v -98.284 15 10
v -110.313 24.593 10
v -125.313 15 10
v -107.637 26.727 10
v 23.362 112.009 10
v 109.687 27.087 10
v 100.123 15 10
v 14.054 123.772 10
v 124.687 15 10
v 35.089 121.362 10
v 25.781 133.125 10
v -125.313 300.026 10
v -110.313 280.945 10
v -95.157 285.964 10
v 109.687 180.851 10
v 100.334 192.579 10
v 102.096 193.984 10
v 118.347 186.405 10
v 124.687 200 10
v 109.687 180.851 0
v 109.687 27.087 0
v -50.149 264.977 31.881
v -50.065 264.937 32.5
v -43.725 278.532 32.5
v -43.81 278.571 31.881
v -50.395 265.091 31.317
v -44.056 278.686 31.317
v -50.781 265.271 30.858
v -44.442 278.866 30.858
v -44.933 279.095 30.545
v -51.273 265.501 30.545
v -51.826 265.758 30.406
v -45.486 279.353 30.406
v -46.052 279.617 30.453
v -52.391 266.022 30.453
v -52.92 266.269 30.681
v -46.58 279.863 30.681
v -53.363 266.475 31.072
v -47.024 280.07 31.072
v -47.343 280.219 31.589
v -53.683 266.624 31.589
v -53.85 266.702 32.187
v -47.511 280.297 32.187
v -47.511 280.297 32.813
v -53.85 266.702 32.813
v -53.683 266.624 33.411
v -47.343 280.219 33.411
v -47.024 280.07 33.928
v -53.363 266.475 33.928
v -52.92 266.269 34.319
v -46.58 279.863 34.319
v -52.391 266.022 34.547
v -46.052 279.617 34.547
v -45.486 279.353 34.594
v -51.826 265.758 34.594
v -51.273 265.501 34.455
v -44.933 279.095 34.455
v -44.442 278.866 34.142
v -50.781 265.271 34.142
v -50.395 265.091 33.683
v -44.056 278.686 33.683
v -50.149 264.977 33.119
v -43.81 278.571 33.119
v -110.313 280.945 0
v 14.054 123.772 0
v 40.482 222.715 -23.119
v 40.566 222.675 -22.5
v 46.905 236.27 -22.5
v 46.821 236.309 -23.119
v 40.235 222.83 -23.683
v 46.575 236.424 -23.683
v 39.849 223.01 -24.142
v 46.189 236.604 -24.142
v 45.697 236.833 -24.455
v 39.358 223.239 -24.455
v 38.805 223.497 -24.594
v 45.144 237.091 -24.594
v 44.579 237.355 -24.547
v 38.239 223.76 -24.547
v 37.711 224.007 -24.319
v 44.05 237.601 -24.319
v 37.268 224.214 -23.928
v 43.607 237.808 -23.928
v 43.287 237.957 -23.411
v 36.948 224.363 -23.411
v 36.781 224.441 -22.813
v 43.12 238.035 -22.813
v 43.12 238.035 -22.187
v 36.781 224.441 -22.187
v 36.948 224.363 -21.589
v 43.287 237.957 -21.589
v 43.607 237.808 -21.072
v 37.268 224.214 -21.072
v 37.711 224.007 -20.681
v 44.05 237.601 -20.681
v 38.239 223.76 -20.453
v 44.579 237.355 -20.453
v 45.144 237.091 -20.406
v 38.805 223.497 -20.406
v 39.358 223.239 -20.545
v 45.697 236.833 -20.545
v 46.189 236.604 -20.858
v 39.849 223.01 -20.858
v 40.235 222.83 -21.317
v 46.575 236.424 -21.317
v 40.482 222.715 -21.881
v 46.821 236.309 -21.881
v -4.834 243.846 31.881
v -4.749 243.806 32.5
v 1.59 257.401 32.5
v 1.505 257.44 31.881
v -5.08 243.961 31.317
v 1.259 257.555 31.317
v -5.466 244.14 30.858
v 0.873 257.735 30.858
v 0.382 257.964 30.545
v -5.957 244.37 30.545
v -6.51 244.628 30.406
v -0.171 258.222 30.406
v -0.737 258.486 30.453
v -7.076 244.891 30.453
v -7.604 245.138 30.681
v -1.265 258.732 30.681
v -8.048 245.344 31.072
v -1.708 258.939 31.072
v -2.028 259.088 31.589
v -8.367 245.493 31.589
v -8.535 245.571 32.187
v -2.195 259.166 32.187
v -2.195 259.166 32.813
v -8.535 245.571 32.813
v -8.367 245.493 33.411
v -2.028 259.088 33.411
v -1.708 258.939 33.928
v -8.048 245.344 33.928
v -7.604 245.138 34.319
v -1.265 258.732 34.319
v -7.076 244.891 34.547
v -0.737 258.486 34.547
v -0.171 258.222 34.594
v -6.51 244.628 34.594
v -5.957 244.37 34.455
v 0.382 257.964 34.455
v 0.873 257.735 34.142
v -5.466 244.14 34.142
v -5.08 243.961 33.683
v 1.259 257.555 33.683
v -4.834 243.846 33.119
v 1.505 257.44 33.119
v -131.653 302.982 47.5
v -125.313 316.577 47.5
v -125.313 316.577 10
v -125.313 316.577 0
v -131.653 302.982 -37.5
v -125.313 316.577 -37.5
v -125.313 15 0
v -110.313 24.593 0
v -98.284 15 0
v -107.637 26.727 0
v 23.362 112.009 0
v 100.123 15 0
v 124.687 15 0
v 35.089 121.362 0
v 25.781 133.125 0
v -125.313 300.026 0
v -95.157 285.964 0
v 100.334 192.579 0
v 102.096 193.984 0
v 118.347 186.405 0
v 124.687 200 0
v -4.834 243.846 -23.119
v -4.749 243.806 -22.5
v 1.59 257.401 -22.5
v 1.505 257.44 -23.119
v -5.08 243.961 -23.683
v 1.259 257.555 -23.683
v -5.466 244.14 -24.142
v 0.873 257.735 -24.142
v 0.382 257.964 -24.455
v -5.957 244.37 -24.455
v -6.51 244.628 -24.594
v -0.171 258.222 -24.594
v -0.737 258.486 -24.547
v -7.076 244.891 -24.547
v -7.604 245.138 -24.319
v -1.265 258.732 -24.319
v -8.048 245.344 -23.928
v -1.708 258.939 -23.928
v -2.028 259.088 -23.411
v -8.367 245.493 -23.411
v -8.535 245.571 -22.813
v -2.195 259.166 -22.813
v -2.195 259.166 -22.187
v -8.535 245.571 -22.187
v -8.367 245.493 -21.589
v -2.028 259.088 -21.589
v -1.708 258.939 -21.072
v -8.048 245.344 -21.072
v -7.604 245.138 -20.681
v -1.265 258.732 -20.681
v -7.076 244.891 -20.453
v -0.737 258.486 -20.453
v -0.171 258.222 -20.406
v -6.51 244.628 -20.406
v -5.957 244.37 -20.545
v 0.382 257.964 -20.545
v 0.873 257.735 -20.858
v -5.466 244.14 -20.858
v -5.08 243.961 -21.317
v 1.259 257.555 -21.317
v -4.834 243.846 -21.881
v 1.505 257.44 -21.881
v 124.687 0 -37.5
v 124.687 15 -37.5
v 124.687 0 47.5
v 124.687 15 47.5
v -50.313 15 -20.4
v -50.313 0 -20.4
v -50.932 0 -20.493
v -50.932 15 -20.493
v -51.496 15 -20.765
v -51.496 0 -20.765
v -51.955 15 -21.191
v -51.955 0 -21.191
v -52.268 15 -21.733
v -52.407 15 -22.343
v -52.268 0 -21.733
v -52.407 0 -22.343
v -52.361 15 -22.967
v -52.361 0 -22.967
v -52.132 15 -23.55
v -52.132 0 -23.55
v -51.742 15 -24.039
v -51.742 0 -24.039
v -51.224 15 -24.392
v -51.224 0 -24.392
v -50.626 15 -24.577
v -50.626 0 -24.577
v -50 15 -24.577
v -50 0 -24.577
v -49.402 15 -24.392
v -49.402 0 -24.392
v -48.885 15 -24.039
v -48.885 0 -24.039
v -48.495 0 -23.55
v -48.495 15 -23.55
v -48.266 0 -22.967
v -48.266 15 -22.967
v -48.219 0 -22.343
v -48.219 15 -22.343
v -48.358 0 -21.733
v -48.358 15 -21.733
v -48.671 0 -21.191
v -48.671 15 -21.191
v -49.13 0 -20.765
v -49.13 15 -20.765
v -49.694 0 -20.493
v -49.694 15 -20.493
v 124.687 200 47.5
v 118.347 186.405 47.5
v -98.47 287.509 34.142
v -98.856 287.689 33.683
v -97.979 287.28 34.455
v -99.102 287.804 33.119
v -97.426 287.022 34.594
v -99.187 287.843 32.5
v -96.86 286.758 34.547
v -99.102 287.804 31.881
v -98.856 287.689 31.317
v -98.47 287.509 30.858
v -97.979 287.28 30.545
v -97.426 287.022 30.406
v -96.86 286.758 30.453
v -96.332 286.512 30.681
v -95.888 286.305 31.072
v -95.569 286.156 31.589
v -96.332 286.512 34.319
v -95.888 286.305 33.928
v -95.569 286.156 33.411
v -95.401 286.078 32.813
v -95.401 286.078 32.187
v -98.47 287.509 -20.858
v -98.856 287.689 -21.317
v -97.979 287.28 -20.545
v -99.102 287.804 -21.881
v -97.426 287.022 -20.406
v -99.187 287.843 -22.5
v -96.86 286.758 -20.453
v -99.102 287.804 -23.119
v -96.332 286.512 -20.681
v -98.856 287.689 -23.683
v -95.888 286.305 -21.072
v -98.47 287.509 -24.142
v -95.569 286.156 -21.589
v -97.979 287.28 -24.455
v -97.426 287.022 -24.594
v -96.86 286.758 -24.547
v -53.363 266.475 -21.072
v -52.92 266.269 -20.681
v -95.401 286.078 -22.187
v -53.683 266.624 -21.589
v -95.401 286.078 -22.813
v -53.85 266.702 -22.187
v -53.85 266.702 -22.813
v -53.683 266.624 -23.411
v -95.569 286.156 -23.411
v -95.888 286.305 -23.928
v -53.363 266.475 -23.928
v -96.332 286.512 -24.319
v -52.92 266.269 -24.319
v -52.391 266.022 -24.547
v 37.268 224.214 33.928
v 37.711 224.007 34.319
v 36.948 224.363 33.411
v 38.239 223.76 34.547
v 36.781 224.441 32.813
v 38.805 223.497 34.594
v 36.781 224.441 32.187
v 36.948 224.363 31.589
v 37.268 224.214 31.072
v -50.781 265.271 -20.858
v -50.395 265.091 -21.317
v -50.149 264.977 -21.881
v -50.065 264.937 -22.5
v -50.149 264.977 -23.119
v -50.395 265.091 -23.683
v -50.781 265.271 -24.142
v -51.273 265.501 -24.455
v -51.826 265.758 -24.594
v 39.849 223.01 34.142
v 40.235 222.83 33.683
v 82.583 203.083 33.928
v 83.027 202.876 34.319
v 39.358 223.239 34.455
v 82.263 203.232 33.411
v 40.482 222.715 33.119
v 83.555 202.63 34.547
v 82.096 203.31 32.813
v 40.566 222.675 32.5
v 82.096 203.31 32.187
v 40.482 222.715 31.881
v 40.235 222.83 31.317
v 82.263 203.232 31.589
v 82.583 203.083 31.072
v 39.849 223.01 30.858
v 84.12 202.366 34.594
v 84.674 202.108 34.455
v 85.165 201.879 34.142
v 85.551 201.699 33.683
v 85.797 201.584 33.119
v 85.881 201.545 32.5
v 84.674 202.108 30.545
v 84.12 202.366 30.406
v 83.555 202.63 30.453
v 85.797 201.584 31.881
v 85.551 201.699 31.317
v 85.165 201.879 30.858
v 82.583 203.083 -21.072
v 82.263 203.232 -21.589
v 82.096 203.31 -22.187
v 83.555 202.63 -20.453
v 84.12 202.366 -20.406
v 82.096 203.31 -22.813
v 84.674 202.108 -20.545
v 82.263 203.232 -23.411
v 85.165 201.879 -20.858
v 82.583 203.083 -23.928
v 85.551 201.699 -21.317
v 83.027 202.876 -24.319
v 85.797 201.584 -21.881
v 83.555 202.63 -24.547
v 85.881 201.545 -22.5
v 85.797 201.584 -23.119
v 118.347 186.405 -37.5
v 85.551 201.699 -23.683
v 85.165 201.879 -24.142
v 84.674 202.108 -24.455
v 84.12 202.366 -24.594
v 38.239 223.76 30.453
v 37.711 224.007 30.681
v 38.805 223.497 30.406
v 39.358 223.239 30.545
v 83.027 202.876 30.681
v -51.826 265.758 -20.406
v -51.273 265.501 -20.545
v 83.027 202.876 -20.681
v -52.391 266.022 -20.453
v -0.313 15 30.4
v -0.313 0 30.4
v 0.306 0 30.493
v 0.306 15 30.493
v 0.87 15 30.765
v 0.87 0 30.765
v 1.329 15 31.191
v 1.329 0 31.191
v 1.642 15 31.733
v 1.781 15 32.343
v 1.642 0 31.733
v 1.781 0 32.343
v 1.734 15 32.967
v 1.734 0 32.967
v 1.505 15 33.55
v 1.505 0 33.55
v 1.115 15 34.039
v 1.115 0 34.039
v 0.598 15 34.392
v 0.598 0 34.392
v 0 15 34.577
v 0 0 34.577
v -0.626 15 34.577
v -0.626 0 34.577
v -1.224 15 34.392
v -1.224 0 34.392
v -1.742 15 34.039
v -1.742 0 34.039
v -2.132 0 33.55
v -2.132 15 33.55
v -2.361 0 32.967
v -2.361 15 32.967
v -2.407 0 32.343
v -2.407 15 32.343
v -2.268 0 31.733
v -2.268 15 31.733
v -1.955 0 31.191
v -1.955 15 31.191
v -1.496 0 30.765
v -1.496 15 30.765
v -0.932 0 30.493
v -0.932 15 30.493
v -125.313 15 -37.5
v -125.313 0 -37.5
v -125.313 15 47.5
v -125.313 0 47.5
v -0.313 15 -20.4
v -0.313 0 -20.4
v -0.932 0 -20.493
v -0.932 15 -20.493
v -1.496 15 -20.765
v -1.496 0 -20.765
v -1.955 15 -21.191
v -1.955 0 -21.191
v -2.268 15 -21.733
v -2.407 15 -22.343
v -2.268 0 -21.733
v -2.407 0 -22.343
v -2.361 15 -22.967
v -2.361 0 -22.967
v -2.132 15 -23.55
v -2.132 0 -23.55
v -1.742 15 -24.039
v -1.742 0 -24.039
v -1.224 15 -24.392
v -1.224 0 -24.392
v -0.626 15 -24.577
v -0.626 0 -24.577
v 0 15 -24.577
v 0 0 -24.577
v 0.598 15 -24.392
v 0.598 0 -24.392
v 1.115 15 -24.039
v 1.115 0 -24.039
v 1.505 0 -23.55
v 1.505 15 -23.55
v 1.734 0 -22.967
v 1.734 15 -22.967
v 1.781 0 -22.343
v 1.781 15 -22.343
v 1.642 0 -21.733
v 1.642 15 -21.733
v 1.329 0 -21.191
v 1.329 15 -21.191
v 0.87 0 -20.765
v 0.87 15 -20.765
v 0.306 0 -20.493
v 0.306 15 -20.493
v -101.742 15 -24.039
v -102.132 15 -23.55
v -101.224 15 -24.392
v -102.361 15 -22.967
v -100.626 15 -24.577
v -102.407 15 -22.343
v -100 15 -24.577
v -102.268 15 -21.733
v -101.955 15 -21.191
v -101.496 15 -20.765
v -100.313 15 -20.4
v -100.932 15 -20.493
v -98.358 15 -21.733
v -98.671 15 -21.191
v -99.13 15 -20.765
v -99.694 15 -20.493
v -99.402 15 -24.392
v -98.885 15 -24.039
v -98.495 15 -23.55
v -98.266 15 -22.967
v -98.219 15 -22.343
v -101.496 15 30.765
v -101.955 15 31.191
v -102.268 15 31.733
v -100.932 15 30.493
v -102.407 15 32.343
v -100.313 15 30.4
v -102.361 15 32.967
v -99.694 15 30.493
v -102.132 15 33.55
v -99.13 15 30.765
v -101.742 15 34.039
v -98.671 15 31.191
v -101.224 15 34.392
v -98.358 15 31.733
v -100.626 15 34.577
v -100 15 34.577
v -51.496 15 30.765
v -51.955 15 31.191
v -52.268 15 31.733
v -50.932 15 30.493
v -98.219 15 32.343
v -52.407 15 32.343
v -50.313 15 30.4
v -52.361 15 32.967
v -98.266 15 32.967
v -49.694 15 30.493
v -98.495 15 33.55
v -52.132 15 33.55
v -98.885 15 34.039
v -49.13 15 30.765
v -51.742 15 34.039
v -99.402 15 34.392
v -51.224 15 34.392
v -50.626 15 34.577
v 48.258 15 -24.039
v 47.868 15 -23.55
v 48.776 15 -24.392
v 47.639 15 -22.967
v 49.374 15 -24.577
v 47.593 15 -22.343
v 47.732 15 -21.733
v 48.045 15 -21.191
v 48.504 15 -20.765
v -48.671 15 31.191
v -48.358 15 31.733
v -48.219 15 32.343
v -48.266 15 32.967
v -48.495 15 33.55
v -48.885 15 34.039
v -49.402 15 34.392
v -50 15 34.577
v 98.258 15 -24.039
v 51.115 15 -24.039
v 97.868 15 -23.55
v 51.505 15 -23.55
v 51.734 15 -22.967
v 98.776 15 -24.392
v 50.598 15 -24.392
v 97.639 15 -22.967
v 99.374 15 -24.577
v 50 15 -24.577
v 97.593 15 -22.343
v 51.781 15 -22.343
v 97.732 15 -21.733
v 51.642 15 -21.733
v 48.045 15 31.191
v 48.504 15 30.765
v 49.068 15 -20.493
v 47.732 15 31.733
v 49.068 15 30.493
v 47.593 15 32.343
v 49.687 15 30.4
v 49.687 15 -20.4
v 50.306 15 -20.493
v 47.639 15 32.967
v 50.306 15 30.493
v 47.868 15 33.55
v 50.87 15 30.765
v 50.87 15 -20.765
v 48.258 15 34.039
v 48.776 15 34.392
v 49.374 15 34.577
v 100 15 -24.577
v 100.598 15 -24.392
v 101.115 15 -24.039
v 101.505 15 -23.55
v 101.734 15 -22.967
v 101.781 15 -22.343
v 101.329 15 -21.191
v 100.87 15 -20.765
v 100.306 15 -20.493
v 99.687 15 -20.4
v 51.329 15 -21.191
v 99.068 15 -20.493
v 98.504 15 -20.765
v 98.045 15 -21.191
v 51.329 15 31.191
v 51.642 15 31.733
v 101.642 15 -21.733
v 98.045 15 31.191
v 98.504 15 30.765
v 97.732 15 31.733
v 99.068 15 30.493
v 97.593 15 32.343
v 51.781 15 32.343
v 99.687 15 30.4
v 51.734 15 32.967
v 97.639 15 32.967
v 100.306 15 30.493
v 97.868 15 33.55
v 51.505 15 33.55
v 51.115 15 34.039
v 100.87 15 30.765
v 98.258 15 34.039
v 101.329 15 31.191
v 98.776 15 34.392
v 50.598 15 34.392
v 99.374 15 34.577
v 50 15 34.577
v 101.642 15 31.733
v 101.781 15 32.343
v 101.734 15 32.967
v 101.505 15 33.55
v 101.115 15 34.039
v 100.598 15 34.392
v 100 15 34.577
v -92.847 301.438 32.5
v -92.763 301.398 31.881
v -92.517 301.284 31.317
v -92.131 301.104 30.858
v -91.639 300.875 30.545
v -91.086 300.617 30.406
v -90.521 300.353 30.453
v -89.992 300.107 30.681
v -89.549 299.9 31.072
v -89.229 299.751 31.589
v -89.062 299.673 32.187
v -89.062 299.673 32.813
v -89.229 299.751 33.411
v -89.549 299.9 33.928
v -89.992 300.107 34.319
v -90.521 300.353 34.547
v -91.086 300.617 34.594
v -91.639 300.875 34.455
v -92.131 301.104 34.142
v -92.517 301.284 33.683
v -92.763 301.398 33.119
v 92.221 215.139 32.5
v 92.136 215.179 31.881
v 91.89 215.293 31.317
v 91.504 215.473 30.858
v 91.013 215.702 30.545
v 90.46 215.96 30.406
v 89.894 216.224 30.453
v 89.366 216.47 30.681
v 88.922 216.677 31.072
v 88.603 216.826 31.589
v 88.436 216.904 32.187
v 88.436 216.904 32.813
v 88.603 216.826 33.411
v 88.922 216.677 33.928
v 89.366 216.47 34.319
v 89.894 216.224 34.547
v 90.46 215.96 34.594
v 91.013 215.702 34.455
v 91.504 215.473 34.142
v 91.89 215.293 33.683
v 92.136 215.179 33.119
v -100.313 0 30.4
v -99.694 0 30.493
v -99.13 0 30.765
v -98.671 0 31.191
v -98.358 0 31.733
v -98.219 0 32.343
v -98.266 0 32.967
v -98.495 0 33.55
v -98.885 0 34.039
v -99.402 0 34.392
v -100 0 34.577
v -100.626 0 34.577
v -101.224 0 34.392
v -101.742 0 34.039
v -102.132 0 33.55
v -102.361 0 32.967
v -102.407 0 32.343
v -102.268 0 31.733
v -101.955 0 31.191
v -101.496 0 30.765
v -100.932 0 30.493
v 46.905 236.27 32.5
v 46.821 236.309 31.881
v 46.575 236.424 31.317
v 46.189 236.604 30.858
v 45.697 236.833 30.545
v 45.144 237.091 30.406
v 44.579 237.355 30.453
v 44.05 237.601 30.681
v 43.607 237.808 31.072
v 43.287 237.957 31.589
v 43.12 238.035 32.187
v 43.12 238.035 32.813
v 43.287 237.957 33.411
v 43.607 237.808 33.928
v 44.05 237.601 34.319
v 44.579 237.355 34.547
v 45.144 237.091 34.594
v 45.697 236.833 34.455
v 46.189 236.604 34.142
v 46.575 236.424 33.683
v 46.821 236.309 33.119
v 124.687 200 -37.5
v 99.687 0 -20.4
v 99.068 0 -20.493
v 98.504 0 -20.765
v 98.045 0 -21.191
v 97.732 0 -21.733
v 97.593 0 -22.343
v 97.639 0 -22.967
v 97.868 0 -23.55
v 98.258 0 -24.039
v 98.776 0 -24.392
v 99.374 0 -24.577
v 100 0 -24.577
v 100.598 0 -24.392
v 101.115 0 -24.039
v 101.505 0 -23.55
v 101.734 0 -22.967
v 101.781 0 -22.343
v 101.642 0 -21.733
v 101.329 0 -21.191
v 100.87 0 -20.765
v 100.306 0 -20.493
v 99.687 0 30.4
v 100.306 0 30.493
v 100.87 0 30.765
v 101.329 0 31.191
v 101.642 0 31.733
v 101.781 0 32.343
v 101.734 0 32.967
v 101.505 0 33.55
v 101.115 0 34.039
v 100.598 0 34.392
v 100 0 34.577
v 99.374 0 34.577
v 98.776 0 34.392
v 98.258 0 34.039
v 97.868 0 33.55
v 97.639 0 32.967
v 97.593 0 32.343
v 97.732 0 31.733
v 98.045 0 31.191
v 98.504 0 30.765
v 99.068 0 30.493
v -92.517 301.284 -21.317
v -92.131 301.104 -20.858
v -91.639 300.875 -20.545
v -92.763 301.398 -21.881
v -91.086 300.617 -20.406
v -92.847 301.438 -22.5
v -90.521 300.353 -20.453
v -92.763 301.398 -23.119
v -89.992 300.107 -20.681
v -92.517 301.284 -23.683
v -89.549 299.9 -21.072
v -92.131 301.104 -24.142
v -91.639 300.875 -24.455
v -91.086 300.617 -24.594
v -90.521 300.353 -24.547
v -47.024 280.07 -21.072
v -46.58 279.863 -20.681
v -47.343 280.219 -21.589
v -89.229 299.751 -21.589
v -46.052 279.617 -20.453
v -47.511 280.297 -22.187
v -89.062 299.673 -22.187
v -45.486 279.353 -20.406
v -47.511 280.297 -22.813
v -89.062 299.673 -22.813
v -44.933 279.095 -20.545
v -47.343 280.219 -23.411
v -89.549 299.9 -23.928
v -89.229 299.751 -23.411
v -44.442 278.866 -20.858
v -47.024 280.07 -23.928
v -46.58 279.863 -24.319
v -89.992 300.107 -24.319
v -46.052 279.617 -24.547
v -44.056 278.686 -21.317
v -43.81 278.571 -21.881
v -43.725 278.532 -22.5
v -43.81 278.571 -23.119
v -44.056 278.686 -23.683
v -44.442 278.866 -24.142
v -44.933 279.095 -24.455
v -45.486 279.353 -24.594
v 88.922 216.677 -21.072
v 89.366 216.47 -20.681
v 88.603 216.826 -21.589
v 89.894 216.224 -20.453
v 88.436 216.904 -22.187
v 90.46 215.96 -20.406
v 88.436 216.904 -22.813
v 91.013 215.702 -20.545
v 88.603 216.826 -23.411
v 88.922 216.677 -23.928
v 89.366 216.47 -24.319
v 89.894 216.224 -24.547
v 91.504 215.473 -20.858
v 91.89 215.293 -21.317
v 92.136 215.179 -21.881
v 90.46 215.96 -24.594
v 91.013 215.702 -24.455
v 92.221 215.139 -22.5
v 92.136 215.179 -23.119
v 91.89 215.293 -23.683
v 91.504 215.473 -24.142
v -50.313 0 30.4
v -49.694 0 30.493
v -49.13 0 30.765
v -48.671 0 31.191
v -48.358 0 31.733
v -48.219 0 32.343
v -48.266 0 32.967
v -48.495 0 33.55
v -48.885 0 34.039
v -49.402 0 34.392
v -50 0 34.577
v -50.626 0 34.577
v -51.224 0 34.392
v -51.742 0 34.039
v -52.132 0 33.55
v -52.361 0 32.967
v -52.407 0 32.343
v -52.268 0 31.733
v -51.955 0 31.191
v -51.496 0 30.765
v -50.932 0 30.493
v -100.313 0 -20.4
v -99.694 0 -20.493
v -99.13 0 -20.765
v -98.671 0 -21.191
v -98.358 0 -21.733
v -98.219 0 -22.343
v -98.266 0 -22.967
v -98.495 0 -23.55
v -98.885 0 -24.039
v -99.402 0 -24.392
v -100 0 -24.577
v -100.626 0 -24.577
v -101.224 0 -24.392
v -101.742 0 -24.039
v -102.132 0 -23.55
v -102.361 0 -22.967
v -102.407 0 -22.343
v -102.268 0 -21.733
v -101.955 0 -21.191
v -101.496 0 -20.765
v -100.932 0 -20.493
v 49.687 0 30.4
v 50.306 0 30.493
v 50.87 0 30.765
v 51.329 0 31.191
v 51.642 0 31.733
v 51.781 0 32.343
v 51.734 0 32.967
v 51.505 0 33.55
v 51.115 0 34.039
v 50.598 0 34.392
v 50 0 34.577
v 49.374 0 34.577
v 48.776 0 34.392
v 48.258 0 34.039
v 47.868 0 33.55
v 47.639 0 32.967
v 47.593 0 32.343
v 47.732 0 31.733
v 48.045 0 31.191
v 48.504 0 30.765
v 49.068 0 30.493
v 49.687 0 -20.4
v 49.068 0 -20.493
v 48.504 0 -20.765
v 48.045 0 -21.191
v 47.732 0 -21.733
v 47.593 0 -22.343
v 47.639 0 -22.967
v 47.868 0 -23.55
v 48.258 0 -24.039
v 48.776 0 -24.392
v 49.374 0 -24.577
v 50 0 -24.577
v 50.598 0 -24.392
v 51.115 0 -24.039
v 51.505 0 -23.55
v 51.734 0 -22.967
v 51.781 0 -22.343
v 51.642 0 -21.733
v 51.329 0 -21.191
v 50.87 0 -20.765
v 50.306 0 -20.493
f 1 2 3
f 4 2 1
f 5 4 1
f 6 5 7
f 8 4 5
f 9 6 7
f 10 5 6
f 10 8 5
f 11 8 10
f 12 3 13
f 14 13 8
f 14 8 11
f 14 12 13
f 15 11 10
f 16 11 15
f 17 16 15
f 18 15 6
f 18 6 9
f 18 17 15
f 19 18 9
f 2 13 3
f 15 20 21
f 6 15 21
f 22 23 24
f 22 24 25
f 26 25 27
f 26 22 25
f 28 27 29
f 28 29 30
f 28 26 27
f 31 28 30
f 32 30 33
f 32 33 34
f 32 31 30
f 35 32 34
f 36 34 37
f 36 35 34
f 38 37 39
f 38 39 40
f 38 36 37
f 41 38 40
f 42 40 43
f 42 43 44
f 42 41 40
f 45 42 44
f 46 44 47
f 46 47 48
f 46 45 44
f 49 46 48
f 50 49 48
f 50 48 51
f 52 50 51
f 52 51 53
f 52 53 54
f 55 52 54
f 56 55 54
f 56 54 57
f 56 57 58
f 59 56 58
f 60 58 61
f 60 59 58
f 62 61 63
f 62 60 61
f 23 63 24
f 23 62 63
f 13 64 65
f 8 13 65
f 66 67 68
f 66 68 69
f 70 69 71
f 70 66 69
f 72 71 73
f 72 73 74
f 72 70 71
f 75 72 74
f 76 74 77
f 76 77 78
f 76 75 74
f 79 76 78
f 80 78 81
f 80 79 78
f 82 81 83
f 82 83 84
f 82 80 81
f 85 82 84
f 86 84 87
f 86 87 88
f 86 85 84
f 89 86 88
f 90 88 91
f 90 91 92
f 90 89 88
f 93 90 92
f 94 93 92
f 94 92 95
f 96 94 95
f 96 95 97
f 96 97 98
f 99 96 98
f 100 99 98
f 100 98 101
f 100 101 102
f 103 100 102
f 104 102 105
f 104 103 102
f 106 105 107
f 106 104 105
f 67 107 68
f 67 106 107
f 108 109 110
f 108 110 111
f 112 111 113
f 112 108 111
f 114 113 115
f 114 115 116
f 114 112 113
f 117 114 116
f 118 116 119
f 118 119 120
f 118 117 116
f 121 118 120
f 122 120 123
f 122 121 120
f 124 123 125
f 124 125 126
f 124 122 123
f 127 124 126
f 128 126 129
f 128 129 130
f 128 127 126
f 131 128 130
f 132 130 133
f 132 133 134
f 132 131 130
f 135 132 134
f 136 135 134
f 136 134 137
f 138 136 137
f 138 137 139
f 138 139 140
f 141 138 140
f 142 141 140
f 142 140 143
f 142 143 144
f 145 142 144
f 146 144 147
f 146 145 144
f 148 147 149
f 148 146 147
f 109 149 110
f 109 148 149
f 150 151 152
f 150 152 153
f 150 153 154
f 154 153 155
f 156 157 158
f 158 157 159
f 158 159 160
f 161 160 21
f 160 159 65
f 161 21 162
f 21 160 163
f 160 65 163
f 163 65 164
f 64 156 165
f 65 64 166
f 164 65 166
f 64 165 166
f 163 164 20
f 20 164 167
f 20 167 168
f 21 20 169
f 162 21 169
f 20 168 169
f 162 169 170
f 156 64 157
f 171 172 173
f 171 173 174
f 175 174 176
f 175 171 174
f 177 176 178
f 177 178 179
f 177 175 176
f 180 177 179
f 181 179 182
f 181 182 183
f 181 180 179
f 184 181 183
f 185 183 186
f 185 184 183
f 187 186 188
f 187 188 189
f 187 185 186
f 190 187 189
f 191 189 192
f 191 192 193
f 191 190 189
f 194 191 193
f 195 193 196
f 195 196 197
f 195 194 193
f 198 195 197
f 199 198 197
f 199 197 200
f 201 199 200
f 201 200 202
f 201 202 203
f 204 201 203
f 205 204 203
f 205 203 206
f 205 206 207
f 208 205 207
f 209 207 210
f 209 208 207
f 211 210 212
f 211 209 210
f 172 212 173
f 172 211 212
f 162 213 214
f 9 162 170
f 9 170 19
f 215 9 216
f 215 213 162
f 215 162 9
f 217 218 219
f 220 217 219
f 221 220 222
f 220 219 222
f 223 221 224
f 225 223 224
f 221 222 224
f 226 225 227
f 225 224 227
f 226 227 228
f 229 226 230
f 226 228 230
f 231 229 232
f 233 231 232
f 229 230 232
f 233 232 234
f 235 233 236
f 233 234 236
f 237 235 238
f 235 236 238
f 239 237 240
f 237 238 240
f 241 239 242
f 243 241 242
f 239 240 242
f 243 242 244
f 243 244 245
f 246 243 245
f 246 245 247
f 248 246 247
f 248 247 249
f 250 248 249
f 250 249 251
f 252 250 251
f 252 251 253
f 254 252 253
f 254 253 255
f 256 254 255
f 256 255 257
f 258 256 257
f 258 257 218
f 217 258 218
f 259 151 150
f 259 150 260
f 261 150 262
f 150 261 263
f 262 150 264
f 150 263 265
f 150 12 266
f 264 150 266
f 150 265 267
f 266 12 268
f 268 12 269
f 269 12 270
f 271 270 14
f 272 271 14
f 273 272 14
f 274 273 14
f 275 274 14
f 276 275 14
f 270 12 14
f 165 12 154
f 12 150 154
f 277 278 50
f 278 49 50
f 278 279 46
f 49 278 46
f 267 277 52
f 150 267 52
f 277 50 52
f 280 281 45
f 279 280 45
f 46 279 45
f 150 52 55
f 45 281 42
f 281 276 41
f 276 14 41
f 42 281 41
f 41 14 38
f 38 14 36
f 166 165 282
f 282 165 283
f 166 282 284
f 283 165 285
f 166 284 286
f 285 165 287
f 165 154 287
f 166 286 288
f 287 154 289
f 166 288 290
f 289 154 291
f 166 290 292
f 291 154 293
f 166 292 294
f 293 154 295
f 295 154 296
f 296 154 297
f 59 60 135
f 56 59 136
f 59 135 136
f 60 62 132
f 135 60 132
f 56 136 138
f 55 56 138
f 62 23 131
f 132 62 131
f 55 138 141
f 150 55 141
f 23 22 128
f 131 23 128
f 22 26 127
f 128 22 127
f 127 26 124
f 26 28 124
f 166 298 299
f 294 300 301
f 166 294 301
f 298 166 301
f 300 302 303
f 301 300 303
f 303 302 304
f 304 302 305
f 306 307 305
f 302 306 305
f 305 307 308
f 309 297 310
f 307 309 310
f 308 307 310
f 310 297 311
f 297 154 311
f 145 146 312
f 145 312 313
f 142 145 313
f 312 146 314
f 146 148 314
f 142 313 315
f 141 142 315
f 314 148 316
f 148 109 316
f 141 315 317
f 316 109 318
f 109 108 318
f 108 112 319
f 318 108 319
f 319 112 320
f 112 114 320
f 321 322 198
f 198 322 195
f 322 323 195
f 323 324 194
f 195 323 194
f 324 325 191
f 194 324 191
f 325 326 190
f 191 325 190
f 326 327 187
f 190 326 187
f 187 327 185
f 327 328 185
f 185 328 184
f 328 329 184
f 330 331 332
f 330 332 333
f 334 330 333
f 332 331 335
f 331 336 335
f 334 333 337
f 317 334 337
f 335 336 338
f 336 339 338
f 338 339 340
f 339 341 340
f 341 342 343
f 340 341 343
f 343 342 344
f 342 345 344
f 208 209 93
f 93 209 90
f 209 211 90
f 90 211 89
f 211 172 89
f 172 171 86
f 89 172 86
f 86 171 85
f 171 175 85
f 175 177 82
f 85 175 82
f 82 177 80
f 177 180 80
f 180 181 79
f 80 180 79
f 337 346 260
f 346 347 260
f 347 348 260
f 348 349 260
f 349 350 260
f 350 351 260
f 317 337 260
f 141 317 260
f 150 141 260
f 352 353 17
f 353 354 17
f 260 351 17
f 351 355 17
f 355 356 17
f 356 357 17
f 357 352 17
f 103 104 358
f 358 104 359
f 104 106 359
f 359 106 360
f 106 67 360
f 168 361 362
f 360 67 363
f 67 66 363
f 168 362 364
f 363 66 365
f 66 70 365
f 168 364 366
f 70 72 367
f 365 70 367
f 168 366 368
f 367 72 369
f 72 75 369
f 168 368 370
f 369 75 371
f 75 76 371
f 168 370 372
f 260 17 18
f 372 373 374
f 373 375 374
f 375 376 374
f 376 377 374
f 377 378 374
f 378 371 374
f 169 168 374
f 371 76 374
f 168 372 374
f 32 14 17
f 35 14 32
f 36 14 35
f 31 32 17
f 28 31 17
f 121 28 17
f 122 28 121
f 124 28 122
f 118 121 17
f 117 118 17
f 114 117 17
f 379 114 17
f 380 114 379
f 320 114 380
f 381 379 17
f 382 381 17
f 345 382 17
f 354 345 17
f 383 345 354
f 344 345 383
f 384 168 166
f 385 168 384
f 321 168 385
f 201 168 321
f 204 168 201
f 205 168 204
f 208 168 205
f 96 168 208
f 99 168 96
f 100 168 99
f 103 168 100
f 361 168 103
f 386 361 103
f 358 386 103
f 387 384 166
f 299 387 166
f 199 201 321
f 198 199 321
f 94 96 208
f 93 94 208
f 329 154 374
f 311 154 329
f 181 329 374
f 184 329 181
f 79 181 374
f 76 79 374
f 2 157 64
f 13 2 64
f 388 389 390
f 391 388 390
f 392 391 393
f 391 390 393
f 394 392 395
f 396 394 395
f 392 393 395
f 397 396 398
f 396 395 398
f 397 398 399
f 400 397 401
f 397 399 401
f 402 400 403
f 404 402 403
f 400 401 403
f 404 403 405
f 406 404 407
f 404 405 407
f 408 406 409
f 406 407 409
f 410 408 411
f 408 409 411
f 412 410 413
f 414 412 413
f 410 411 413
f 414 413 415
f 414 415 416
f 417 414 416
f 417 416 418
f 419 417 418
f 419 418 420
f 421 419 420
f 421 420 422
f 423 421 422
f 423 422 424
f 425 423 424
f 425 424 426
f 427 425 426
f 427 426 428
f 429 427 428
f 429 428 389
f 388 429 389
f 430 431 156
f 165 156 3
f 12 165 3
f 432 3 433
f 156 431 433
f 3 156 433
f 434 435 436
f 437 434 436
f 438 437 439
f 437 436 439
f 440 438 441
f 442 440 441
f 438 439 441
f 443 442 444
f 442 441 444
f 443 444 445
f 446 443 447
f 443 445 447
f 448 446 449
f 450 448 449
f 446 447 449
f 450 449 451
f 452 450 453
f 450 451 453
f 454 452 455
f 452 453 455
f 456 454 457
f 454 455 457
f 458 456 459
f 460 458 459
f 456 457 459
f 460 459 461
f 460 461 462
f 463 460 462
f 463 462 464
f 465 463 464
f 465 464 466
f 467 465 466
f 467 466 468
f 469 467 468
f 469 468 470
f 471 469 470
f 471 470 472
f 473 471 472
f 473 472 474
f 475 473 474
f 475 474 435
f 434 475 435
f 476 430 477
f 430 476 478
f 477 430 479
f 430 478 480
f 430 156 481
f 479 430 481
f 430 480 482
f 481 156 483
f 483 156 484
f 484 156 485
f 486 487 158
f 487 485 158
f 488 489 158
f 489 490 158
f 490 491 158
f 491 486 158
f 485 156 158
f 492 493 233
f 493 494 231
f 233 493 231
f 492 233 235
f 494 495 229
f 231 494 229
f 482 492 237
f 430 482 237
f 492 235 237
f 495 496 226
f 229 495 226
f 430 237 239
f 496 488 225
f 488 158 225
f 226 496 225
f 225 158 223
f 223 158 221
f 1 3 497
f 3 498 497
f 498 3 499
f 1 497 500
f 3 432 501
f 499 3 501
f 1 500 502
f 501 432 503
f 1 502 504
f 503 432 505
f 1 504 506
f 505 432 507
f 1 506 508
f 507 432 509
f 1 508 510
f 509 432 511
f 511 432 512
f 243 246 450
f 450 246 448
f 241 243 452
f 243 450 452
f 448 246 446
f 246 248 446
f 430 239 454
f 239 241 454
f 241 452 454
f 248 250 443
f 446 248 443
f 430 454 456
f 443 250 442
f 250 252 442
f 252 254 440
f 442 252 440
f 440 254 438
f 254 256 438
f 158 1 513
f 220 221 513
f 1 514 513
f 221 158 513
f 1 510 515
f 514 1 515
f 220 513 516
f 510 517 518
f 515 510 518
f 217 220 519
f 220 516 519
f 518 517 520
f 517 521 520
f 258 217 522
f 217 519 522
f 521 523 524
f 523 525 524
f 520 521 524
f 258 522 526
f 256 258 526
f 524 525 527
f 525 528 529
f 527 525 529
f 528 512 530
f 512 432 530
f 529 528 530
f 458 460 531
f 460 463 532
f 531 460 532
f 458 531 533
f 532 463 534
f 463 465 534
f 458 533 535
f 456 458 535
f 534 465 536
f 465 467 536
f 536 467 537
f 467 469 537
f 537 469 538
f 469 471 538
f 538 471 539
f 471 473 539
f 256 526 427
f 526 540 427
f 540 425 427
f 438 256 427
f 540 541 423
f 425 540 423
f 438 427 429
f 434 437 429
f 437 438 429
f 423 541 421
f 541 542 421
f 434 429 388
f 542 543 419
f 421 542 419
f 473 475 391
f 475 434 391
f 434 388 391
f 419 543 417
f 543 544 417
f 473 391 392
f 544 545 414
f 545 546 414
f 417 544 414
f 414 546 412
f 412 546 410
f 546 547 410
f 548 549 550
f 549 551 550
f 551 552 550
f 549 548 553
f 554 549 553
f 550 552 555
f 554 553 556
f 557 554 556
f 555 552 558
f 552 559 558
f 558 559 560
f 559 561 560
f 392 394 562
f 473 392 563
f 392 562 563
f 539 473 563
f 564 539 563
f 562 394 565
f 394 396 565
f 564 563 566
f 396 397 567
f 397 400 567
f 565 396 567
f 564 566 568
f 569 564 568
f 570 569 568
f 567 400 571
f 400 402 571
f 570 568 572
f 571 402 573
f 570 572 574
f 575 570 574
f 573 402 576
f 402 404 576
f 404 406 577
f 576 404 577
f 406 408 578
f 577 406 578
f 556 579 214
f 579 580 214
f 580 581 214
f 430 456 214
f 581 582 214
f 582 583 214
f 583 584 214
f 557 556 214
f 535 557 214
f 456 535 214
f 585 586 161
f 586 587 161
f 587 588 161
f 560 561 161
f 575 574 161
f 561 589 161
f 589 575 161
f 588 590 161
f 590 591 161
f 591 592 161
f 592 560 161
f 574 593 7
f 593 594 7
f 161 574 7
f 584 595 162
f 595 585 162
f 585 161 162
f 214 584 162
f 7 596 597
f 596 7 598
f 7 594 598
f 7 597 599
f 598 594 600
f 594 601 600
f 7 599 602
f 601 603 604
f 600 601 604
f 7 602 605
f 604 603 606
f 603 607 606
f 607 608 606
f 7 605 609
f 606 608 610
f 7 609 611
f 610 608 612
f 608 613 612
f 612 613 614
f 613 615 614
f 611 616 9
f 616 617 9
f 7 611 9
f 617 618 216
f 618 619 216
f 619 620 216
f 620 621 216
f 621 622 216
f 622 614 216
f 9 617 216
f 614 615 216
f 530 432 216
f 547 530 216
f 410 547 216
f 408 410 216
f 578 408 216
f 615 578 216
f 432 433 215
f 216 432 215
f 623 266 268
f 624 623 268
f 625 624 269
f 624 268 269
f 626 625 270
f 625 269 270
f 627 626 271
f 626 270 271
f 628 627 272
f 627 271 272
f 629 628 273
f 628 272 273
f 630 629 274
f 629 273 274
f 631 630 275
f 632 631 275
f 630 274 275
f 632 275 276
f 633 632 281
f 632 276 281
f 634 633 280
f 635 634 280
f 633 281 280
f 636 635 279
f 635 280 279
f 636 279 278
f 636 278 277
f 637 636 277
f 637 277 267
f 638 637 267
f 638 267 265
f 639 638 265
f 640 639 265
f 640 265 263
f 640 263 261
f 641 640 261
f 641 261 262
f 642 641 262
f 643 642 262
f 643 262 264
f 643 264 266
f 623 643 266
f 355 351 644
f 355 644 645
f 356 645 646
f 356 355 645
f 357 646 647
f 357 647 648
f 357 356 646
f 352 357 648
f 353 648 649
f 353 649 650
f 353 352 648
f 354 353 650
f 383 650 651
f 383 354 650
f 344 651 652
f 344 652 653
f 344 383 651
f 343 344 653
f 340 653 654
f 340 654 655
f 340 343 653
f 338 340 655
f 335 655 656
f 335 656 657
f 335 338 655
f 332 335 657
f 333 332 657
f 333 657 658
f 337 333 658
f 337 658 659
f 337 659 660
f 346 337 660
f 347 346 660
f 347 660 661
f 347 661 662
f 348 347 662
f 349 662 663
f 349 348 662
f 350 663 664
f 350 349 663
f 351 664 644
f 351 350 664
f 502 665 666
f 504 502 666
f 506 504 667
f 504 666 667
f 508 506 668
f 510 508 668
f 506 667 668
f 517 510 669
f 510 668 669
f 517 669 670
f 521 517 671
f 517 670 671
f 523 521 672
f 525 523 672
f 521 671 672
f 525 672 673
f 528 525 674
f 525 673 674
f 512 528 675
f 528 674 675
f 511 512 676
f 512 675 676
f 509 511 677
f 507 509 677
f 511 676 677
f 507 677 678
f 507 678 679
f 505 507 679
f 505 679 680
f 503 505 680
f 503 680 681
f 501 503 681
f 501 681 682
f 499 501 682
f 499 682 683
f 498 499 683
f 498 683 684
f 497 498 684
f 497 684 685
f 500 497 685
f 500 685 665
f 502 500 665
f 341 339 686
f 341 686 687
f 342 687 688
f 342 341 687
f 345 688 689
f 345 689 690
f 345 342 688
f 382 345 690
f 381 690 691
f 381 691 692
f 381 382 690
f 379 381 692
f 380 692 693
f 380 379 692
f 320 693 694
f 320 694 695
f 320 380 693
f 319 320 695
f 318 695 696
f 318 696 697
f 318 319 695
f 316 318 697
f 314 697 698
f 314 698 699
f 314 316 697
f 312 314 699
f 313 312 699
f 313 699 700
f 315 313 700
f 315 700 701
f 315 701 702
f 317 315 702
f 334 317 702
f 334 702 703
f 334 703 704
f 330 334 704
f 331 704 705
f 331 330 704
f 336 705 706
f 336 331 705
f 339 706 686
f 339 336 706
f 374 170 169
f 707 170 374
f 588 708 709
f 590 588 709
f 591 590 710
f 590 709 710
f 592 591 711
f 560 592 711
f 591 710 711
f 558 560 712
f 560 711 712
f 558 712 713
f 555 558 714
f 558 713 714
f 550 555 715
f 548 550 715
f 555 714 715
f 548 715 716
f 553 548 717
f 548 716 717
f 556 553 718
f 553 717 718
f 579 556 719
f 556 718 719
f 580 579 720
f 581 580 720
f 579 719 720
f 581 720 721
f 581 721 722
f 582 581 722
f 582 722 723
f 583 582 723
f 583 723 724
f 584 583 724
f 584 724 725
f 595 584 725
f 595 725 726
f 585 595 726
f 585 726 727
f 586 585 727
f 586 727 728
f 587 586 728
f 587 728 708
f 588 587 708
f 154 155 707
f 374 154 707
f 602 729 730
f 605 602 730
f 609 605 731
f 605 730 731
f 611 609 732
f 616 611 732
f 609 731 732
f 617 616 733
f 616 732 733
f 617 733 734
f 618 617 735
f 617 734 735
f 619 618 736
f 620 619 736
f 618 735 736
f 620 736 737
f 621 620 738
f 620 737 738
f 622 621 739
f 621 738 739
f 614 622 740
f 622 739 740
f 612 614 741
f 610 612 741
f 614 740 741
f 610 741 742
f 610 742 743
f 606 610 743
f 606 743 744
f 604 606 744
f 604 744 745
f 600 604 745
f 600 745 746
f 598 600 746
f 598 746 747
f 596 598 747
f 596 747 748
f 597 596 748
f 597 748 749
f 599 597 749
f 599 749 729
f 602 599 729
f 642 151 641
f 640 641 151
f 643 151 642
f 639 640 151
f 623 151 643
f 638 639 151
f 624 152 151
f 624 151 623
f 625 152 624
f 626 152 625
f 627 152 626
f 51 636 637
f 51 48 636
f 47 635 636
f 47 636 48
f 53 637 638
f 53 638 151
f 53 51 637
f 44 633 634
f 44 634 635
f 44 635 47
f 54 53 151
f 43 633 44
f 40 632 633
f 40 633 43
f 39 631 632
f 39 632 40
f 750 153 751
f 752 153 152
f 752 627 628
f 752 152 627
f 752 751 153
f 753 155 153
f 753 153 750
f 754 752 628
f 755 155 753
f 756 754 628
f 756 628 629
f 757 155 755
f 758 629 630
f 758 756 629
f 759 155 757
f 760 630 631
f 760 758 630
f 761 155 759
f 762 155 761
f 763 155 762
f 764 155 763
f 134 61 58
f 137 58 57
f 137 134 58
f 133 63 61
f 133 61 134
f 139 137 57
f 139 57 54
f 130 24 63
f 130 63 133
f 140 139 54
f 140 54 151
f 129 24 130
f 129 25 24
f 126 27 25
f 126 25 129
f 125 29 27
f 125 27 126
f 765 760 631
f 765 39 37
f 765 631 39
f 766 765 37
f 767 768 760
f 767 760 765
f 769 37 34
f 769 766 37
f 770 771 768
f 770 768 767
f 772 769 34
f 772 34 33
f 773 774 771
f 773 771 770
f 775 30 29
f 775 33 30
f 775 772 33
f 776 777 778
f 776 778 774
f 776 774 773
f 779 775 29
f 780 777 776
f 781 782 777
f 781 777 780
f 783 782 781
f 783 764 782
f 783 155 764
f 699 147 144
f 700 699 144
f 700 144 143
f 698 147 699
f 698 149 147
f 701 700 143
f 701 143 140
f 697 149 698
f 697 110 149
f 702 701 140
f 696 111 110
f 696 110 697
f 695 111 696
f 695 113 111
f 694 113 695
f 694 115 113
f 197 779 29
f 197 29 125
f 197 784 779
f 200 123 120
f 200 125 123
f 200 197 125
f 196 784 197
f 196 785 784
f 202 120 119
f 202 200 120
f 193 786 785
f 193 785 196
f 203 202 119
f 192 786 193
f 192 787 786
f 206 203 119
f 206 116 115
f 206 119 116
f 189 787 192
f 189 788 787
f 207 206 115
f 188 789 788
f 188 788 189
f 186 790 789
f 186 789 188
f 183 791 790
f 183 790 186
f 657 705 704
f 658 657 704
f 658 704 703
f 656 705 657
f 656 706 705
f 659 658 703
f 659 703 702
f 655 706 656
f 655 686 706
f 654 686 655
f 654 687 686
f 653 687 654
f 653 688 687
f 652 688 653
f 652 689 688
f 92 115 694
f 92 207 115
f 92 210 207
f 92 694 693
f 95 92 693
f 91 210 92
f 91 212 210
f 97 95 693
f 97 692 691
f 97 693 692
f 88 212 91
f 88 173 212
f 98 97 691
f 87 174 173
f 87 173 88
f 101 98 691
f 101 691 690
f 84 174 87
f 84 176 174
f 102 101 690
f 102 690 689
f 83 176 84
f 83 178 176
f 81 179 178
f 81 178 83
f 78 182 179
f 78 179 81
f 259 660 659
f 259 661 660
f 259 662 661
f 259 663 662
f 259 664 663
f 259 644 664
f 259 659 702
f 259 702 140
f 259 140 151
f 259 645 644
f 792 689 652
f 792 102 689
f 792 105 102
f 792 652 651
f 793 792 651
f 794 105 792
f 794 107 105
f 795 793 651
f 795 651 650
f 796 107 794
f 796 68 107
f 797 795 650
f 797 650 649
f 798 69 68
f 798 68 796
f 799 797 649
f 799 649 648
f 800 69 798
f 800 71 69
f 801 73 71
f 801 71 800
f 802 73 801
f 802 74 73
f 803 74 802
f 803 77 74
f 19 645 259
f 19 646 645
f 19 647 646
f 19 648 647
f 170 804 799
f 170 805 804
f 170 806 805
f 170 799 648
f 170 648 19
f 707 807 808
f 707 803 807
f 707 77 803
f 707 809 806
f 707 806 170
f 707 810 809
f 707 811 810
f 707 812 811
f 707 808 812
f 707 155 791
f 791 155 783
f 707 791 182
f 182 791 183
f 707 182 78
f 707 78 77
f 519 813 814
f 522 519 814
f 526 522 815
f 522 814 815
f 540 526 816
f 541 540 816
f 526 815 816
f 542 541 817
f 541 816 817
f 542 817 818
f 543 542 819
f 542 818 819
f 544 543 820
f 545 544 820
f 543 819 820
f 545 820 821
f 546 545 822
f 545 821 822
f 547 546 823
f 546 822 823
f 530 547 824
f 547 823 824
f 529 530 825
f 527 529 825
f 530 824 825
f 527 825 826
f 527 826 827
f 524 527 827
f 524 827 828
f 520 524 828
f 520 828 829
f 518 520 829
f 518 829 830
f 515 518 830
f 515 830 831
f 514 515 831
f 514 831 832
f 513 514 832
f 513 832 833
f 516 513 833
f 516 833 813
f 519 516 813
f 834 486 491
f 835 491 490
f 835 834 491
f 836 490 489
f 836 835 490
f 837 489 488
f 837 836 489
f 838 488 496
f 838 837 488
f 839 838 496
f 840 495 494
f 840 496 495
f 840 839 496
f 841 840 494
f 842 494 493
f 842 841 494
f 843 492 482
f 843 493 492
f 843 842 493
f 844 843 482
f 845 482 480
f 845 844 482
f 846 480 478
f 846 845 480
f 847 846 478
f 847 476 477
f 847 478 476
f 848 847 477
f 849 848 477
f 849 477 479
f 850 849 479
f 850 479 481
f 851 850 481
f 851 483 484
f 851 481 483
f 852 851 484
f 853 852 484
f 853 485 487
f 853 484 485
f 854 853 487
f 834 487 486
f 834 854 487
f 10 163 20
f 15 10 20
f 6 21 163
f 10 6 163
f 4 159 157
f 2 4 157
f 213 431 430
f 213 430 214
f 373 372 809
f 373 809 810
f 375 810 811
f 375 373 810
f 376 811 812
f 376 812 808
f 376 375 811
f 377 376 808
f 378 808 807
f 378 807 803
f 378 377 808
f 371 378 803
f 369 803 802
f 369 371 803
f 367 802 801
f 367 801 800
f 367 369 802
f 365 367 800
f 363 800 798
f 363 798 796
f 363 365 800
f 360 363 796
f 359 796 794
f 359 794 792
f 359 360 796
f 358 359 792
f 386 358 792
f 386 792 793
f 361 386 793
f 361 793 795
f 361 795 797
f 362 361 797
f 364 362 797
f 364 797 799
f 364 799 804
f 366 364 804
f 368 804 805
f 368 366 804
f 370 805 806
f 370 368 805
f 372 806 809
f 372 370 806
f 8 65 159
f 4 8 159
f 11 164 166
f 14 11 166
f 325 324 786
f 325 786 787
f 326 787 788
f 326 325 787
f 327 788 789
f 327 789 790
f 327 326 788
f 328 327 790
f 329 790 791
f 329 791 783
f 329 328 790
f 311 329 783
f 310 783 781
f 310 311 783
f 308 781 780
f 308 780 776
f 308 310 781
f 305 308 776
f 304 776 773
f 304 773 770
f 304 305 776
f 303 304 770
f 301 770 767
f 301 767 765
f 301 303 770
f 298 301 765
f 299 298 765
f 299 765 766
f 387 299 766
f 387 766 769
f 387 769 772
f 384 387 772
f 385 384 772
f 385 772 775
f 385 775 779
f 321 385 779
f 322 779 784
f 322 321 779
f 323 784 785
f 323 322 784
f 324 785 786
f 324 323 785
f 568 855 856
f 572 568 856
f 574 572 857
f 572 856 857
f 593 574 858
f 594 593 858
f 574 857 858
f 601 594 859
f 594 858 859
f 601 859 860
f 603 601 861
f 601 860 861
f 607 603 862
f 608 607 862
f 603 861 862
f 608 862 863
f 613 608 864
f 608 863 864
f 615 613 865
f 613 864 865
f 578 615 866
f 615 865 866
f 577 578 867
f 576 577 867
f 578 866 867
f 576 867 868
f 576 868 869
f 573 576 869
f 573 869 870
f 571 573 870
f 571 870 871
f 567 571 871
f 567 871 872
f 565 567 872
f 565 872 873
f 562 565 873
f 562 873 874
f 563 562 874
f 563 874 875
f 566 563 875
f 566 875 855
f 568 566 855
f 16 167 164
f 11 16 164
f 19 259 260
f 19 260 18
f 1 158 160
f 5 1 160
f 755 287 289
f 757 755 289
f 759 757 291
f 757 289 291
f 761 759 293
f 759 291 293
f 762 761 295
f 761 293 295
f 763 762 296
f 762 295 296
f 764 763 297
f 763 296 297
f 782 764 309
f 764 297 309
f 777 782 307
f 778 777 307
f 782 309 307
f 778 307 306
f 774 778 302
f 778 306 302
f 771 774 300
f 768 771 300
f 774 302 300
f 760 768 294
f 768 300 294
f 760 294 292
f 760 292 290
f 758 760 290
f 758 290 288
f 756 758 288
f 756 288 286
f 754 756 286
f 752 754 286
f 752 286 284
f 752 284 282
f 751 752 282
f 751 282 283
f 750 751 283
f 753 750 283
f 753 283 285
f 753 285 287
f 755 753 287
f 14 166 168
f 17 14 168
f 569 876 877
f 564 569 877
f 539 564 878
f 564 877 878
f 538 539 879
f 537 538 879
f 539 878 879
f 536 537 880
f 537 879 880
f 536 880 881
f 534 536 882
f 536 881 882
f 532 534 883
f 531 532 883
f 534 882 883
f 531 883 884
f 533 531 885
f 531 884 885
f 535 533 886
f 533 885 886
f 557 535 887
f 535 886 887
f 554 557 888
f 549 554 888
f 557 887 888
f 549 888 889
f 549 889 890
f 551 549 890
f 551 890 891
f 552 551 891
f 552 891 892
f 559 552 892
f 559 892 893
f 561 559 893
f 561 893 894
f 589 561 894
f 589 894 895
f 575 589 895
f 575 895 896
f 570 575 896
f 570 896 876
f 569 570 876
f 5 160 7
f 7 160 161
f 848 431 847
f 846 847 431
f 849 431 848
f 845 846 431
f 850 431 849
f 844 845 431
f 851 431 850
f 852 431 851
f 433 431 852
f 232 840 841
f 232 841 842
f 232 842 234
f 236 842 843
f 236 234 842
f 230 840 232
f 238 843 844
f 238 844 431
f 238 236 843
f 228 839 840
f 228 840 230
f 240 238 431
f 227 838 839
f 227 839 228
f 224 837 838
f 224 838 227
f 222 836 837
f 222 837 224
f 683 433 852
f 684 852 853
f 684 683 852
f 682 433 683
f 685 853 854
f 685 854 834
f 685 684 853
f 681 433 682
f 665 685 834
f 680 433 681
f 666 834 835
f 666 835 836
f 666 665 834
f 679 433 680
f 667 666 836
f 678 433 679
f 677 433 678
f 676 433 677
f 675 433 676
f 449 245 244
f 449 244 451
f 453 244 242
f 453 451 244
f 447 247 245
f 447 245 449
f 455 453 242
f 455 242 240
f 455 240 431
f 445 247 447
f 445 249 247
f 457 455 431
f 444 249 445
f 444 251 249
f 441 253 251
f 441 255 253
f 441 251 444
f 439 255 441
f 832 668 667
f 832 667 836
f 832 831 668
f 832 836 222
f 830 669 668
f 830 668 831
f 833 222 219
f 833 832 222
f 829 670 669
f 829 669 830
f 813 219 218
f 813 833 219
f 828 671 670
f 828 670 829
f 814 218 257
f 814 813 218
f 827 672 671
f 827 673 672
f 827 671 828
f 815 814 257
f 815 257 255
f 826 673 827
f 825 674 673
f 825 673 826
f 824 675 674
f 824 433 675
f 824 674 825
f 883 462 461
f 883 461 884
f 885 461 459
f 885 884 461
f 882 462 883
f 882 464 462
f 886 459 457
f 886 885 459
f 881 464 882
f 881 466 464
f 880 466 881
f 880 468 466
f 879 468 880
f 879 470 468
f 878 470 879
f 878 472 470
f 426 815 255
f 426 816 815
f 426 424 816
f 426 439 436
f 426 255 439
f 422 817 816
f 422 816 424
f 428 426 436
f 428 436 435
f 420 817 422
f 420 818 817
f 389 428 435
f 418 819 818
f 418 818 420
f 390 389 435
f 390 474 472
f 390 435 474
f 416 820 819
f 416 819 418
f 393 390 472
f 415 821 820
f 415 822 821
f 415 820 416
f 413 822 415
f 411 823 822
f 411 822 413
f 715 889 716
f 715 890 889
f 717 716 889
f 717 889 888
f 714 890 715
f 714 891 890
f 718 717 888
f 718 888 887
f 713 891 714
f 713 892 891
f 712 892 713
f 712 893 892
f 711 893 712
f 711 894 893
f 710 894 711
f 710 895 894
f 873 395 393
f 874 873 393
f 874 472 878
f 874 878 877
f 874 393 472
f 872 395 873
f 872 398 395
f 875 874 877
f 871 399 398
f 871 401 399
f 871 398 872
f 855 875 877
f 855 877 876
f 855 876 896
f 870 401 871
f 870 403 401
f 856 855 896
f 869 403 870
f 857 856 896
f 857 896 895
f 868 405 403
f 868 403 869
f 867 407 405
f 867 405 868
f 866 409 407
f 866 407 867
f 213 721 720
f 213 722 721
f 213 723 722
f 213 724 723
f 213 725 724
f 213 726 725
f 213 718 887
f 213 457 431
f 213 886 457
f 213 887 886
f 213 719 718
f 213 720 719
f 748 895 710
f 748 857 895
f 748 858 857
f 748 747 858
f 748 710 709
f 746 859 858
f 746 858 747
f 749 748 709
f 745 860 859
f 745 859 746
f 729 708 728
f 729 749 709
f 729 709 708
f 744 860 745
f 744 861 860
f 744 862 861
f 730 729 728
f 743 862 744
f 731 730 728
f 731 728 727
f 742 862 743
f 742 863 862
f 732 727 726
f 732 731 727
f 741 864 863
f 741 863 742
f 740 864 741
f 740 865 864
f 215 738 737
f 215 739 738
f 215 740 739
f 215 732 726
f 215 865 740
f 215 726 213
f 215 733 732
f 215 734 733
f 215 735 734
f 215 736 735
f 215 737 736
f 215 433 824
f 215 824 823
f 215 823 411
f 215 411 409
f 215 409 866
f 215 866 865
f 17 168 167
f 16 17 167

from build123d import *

# Parameters (mm, degrees)
EXTRUDE_1_DEPTH            = 10
SKETCH_3_W                 = 250
SKETCH_3_H                 = 25
EXTRUDE_3_DEPTH            = 15
SKETCH_4_W                 = 275.84447974
SKETCH_4_H                 = 25
EXTRUDE_4_DEPTH            = 15
SKETCH_10_W                = 250
SKETCH_10_H                = 30
EXTRUDE_5_DEPTH            = 15
SKETCH_11_W                = 275.84447974
SKETCH_11_H                = 30
EXTRUDE_6_DEPTH            = 15
HOLE_WIZARD_M5_1_D         = 4.2
HOLE_WIZARD_M5_1_DEPTH     = 15
PATTERN_LINEAR_1_COUNT     = 5
PATTERN_LINEAR_1_PITCH     = 50
MIRROR_1_COPY_1_D          = 4.2
MIRROR_1_COPY_1_DEPTH      = 15
MIRROR_1_COPY_2_D          = 4.2
MIRROR_1_COPY_2_DEPTH      = 15
MIRROR_1_COPY_3_D          = 4.2
MIRROR_1_COPY_3_DEPTH      = 15
MIRROR_1_COPY_4_D          = 4.2
MIRROR_1_COPY_4_DEPTH      = 15
HOLE_WIZARD_M5_2_D         = 4.2
PATTERN_START              = 218.95644092
PATTERN_LINEAR_2_OUTLINE_R = 2.1
PATTERN_LINEAR_2_DEPTH     = 15
HOLE_WIZARD_M5_3_D         = 4.2
PATTERN_LINEAR_3_OUTLINE_R = 2.1
PATTERN_LINEAR_3_DEPTH     = 15


# Read off the part's stored shape, not the designer's step: 阵列(线性)2, 阵列(线性)3
with BuildPart() as part:
    # 草图1 → 凸台-拉伸1 (new body)
    with BuildSketch(Plane.XY):
        Polygon((-125.313283208, 0), (124.686716792, 0), (124.686716792, 200), (-125.313283208, 316.576914539), align=None)
        Polygon((-110.313283208, 24.592855818), (-110.313283208, 280.944896886), (14.053831361, 123.772207379), (-107.63654934, 26.72747742), align=None, mode=Mode.SUBTRACT)
        Polygon((23.361623829, 112.009204107), (100.122763689, 15), (-98.284208811, 15), align=None, mode=Mode.SUBTRACT)
        Polygon((109.686716792, 180.85109027), (109.686716792, 27.086733996), (35.089185859, 121.36161211), align=None, mode=Mode.SUBTRACT)
        Polygon((-95.156980934, 285.964131062), (102.096111819, 193.983503317), (100.334376264, 192.57856769), (25.781393391, 133.124615382), align=None, mode=Mode.SUBTRACT)
    extrude(amount=EXTRUDE_1_DEPTH)

    # 草图3 → 凸台-拉伸3 (add)
    with BuildSketch(Plane.XZ):
        with Locations((-0.313283208, 5)):
            Rectangle(SKETCH_3_W, SKETCH_3_H)
    extrude(amount=-EXTRUDE_3_DEPTH)

    # 草图4 → 凸台-拉伸4 (add)
    with BuildSketch(Plane(origin=(98.874264385, 212.036544233, 0), x_dir=(0.9063077870366497, -0.4226182617407002, 0), z_dir=(0.42261826174070016, 0.9063077870366496, 0))):
        with Locations((-109.44134985, -5)):
            Rectangle(SKETCH_4_W, SKETCH_4_H)
    extrude(amount=-EXTRUDE_4_DEPTH)

    # 草图10 → 凸台-拉伸5 (add)
    with BuildSketch(Plane.XZ):
        with Locations((-0.313283208, 32.5)):
            Rectangle(SKETCH_10_W, SKETCH_10_H)
        with Locations((-0.313283208, -22.5)):
            Rectangle(SKETCH_10_W, SKETCH_10_H)
    extrude(amount=-EXTRUDE_5_DEPTH)

    # 草图11 → 凸台-拉伸6 (add)
    with BuildSketch(Plane(origin=(98.874264385, 212.036544233, 0), x_dir=(0.9063077870366497, -0.4226182617407002, 0), z_dir=(0.42261826174070016, 0.9063077870366496, 0))):
        with Locations((-109.44134985, 22.5)):
            Rectangle(SKETCH_11_W, SKETCH_11_H)
        with Locations((-109.44134985, -32.5)):
            Rectangle(SKETCH_11_W, SKETCH_11_H)
    extrude(amount=-EXTRUDE_6_DEPTH)

    # M5 螺纹孔1
    with Locations(Plane(origin=(-100.313283208, 15, 32.5), x_dir=(0, 0, 1), z_dir=(0, 1, 0))):
        with Locations((0, 0)):
            hole_wizard_m5_1 = Hole(HOLE_WIZARD_M5_1_D / 2, depth=HOLE_WIZARD_M5_1_DEPTH)

    # 阵列(线性)1: M5 螺纹孔1 ×5
    with Locations(*[(i * PATTERN_LINEAR_1_PITCH, 0, 0) for i in range(1, PATTERN_LINEAR_1_COUNT)]):
        add(hole_wizard_m5_1, mode=Mode.SUBTRACT)

    # 镜向1: M5 螺纹孔1 across plane
    add(hole_wizard_m5_1.mirror(Plane(origin=(0, 0, 5), x_dir=(1, 0, 0), z_dir=(0, 0, -1))), mode=Mode.SUBTRACT)

    # 镜向1 copy 1
    with Locations(Plane(origin=(-50.313283208, 15, -22.5), x_dir=(0, 0, -1), z_dir=(0, 1, 0))):
        with Locations((0, 0)):
            Hole(MIRROR_1_COPY_1_D / 2, depth=MIRROR_1_COPY_1_DEPTH)

    # 镜向1 copy 2
    with Locations(Plane(origin=(-0.313283208, 15, -22.5), x_dir=(0, 0, -1), z_dir=(0, 1, 0))):
        with Locations((0, 0)):
            Hole(MIRROR_1_COPY_2_D / 2, depth=MIRROR_1_COPY_2_DEPTH)

    # 镜向1 copy 3
    with Locations(Plane(origin=(49.686716792, 15, -22.5), x_dir=(0, 0, -1), z_dir=(0, 1, 0))):
        with Locations((0, 0)):
            Hole(MIRROR_1_COPY_3_D / 2, depth=MIRROR_1_COPY_3_DEPTH)

    # 镜向1 copy 4
    with Locations(Plane(origin=(99.686716792, 15, -22.5), x_dir=(0, 0, -1), z_dir=(0, 1, 0))):
        with Locations((0, 0)):
            Hole(MIRROR_1_COPY_4_D / 2, depth=MIRROR_1_COPY_4_DEPTH)

    # M5 螺纹孔2 (through all)
    with Locations(Plane(origin=(-90.944061912, 300.550283443, -22.5), x_dir=(0.906307787037, -0.422618261741, 0), z_dir=(0.422618261741, 0.906307787037, 0))):
        with Locations((0, 0)):
            Hole(HOLE_WIZARD_M5_2_D / 2)

    # 阵列(线性)2 outline → 阵列(线性)2 (cut)
    with BuildSketch(Plane(origin=(0, 0, 0), x_dir=(0.9063077870366497, -0.42261826174069983, 0), z_dir=(0.4226182617406999, 0.9063077870366498, 0)).offset(PATTERN_START)):
        with Locations((-159.44134985, 22.5)):
            Circle(PATTERN_LINEAR_2_OUTLINE_R)
        with Locations((-109.44134985, 22.5)):
            Circle(PATTERN_LINEAR_2_OUTLINE_R)
        with Locations((-59.44134985, 22.5)):
            Circle(PATTERN_LINEAR_2_OUTLINE_R)
        with Locations((-9.44134985, 22.5)):
            Circle(PATTERN_LINEAR_2_OUTLINE_R)
    extrude(amount=PATTERN_LINEAR_2_DEPTH, mode=Mode.SUBTRACT)

    # M5 螺纹孔3 (through all)
    with Locations(Plane(origin=(-90.944061912, 300.550283443, 32.5), x_dir=(0.906307787037, -0.422618261741, 0), z_dir=(0.422618261741, 0.906307787037, 0))):
        with Locations((0, 0)):
            Hole(HOLE_WIZARD_M5_3_D / 2)

    # 阵列(线性)3 outline → 阵列(线性)3 (cut)
    with BuildSketch(Plane(origin=(0, 0, 0), x_dir=(0.9063077870366497, -0.42261826174069983, 0), z_dir=(0.4226182617406999, 0.9063077870366498, 0)).offset(PATTERN_START)):
        with Locations((-159.44134985, -32.5)):
            Circle(PATTERN_LINEAR_3_OUTLINE_R)
        with Locations((-109.44134985, -32.5)):
            Circle(PATTERN_LINEAR_3_OUTLINE_R)
        with Locations((-59.44134985, -32.5)):
            Circle(PATTERN_LINEAR_3_OUTLINE_R)
        with Locations((-9.44134985, -32.5)):
            Circle(PATTERN_LINEAR_3_OUTLINE_R)
    extrude(amount=PATTERN_LINEAR_3_DEPTH, mode=Mode.SUBTRACT)


solid = part.part
